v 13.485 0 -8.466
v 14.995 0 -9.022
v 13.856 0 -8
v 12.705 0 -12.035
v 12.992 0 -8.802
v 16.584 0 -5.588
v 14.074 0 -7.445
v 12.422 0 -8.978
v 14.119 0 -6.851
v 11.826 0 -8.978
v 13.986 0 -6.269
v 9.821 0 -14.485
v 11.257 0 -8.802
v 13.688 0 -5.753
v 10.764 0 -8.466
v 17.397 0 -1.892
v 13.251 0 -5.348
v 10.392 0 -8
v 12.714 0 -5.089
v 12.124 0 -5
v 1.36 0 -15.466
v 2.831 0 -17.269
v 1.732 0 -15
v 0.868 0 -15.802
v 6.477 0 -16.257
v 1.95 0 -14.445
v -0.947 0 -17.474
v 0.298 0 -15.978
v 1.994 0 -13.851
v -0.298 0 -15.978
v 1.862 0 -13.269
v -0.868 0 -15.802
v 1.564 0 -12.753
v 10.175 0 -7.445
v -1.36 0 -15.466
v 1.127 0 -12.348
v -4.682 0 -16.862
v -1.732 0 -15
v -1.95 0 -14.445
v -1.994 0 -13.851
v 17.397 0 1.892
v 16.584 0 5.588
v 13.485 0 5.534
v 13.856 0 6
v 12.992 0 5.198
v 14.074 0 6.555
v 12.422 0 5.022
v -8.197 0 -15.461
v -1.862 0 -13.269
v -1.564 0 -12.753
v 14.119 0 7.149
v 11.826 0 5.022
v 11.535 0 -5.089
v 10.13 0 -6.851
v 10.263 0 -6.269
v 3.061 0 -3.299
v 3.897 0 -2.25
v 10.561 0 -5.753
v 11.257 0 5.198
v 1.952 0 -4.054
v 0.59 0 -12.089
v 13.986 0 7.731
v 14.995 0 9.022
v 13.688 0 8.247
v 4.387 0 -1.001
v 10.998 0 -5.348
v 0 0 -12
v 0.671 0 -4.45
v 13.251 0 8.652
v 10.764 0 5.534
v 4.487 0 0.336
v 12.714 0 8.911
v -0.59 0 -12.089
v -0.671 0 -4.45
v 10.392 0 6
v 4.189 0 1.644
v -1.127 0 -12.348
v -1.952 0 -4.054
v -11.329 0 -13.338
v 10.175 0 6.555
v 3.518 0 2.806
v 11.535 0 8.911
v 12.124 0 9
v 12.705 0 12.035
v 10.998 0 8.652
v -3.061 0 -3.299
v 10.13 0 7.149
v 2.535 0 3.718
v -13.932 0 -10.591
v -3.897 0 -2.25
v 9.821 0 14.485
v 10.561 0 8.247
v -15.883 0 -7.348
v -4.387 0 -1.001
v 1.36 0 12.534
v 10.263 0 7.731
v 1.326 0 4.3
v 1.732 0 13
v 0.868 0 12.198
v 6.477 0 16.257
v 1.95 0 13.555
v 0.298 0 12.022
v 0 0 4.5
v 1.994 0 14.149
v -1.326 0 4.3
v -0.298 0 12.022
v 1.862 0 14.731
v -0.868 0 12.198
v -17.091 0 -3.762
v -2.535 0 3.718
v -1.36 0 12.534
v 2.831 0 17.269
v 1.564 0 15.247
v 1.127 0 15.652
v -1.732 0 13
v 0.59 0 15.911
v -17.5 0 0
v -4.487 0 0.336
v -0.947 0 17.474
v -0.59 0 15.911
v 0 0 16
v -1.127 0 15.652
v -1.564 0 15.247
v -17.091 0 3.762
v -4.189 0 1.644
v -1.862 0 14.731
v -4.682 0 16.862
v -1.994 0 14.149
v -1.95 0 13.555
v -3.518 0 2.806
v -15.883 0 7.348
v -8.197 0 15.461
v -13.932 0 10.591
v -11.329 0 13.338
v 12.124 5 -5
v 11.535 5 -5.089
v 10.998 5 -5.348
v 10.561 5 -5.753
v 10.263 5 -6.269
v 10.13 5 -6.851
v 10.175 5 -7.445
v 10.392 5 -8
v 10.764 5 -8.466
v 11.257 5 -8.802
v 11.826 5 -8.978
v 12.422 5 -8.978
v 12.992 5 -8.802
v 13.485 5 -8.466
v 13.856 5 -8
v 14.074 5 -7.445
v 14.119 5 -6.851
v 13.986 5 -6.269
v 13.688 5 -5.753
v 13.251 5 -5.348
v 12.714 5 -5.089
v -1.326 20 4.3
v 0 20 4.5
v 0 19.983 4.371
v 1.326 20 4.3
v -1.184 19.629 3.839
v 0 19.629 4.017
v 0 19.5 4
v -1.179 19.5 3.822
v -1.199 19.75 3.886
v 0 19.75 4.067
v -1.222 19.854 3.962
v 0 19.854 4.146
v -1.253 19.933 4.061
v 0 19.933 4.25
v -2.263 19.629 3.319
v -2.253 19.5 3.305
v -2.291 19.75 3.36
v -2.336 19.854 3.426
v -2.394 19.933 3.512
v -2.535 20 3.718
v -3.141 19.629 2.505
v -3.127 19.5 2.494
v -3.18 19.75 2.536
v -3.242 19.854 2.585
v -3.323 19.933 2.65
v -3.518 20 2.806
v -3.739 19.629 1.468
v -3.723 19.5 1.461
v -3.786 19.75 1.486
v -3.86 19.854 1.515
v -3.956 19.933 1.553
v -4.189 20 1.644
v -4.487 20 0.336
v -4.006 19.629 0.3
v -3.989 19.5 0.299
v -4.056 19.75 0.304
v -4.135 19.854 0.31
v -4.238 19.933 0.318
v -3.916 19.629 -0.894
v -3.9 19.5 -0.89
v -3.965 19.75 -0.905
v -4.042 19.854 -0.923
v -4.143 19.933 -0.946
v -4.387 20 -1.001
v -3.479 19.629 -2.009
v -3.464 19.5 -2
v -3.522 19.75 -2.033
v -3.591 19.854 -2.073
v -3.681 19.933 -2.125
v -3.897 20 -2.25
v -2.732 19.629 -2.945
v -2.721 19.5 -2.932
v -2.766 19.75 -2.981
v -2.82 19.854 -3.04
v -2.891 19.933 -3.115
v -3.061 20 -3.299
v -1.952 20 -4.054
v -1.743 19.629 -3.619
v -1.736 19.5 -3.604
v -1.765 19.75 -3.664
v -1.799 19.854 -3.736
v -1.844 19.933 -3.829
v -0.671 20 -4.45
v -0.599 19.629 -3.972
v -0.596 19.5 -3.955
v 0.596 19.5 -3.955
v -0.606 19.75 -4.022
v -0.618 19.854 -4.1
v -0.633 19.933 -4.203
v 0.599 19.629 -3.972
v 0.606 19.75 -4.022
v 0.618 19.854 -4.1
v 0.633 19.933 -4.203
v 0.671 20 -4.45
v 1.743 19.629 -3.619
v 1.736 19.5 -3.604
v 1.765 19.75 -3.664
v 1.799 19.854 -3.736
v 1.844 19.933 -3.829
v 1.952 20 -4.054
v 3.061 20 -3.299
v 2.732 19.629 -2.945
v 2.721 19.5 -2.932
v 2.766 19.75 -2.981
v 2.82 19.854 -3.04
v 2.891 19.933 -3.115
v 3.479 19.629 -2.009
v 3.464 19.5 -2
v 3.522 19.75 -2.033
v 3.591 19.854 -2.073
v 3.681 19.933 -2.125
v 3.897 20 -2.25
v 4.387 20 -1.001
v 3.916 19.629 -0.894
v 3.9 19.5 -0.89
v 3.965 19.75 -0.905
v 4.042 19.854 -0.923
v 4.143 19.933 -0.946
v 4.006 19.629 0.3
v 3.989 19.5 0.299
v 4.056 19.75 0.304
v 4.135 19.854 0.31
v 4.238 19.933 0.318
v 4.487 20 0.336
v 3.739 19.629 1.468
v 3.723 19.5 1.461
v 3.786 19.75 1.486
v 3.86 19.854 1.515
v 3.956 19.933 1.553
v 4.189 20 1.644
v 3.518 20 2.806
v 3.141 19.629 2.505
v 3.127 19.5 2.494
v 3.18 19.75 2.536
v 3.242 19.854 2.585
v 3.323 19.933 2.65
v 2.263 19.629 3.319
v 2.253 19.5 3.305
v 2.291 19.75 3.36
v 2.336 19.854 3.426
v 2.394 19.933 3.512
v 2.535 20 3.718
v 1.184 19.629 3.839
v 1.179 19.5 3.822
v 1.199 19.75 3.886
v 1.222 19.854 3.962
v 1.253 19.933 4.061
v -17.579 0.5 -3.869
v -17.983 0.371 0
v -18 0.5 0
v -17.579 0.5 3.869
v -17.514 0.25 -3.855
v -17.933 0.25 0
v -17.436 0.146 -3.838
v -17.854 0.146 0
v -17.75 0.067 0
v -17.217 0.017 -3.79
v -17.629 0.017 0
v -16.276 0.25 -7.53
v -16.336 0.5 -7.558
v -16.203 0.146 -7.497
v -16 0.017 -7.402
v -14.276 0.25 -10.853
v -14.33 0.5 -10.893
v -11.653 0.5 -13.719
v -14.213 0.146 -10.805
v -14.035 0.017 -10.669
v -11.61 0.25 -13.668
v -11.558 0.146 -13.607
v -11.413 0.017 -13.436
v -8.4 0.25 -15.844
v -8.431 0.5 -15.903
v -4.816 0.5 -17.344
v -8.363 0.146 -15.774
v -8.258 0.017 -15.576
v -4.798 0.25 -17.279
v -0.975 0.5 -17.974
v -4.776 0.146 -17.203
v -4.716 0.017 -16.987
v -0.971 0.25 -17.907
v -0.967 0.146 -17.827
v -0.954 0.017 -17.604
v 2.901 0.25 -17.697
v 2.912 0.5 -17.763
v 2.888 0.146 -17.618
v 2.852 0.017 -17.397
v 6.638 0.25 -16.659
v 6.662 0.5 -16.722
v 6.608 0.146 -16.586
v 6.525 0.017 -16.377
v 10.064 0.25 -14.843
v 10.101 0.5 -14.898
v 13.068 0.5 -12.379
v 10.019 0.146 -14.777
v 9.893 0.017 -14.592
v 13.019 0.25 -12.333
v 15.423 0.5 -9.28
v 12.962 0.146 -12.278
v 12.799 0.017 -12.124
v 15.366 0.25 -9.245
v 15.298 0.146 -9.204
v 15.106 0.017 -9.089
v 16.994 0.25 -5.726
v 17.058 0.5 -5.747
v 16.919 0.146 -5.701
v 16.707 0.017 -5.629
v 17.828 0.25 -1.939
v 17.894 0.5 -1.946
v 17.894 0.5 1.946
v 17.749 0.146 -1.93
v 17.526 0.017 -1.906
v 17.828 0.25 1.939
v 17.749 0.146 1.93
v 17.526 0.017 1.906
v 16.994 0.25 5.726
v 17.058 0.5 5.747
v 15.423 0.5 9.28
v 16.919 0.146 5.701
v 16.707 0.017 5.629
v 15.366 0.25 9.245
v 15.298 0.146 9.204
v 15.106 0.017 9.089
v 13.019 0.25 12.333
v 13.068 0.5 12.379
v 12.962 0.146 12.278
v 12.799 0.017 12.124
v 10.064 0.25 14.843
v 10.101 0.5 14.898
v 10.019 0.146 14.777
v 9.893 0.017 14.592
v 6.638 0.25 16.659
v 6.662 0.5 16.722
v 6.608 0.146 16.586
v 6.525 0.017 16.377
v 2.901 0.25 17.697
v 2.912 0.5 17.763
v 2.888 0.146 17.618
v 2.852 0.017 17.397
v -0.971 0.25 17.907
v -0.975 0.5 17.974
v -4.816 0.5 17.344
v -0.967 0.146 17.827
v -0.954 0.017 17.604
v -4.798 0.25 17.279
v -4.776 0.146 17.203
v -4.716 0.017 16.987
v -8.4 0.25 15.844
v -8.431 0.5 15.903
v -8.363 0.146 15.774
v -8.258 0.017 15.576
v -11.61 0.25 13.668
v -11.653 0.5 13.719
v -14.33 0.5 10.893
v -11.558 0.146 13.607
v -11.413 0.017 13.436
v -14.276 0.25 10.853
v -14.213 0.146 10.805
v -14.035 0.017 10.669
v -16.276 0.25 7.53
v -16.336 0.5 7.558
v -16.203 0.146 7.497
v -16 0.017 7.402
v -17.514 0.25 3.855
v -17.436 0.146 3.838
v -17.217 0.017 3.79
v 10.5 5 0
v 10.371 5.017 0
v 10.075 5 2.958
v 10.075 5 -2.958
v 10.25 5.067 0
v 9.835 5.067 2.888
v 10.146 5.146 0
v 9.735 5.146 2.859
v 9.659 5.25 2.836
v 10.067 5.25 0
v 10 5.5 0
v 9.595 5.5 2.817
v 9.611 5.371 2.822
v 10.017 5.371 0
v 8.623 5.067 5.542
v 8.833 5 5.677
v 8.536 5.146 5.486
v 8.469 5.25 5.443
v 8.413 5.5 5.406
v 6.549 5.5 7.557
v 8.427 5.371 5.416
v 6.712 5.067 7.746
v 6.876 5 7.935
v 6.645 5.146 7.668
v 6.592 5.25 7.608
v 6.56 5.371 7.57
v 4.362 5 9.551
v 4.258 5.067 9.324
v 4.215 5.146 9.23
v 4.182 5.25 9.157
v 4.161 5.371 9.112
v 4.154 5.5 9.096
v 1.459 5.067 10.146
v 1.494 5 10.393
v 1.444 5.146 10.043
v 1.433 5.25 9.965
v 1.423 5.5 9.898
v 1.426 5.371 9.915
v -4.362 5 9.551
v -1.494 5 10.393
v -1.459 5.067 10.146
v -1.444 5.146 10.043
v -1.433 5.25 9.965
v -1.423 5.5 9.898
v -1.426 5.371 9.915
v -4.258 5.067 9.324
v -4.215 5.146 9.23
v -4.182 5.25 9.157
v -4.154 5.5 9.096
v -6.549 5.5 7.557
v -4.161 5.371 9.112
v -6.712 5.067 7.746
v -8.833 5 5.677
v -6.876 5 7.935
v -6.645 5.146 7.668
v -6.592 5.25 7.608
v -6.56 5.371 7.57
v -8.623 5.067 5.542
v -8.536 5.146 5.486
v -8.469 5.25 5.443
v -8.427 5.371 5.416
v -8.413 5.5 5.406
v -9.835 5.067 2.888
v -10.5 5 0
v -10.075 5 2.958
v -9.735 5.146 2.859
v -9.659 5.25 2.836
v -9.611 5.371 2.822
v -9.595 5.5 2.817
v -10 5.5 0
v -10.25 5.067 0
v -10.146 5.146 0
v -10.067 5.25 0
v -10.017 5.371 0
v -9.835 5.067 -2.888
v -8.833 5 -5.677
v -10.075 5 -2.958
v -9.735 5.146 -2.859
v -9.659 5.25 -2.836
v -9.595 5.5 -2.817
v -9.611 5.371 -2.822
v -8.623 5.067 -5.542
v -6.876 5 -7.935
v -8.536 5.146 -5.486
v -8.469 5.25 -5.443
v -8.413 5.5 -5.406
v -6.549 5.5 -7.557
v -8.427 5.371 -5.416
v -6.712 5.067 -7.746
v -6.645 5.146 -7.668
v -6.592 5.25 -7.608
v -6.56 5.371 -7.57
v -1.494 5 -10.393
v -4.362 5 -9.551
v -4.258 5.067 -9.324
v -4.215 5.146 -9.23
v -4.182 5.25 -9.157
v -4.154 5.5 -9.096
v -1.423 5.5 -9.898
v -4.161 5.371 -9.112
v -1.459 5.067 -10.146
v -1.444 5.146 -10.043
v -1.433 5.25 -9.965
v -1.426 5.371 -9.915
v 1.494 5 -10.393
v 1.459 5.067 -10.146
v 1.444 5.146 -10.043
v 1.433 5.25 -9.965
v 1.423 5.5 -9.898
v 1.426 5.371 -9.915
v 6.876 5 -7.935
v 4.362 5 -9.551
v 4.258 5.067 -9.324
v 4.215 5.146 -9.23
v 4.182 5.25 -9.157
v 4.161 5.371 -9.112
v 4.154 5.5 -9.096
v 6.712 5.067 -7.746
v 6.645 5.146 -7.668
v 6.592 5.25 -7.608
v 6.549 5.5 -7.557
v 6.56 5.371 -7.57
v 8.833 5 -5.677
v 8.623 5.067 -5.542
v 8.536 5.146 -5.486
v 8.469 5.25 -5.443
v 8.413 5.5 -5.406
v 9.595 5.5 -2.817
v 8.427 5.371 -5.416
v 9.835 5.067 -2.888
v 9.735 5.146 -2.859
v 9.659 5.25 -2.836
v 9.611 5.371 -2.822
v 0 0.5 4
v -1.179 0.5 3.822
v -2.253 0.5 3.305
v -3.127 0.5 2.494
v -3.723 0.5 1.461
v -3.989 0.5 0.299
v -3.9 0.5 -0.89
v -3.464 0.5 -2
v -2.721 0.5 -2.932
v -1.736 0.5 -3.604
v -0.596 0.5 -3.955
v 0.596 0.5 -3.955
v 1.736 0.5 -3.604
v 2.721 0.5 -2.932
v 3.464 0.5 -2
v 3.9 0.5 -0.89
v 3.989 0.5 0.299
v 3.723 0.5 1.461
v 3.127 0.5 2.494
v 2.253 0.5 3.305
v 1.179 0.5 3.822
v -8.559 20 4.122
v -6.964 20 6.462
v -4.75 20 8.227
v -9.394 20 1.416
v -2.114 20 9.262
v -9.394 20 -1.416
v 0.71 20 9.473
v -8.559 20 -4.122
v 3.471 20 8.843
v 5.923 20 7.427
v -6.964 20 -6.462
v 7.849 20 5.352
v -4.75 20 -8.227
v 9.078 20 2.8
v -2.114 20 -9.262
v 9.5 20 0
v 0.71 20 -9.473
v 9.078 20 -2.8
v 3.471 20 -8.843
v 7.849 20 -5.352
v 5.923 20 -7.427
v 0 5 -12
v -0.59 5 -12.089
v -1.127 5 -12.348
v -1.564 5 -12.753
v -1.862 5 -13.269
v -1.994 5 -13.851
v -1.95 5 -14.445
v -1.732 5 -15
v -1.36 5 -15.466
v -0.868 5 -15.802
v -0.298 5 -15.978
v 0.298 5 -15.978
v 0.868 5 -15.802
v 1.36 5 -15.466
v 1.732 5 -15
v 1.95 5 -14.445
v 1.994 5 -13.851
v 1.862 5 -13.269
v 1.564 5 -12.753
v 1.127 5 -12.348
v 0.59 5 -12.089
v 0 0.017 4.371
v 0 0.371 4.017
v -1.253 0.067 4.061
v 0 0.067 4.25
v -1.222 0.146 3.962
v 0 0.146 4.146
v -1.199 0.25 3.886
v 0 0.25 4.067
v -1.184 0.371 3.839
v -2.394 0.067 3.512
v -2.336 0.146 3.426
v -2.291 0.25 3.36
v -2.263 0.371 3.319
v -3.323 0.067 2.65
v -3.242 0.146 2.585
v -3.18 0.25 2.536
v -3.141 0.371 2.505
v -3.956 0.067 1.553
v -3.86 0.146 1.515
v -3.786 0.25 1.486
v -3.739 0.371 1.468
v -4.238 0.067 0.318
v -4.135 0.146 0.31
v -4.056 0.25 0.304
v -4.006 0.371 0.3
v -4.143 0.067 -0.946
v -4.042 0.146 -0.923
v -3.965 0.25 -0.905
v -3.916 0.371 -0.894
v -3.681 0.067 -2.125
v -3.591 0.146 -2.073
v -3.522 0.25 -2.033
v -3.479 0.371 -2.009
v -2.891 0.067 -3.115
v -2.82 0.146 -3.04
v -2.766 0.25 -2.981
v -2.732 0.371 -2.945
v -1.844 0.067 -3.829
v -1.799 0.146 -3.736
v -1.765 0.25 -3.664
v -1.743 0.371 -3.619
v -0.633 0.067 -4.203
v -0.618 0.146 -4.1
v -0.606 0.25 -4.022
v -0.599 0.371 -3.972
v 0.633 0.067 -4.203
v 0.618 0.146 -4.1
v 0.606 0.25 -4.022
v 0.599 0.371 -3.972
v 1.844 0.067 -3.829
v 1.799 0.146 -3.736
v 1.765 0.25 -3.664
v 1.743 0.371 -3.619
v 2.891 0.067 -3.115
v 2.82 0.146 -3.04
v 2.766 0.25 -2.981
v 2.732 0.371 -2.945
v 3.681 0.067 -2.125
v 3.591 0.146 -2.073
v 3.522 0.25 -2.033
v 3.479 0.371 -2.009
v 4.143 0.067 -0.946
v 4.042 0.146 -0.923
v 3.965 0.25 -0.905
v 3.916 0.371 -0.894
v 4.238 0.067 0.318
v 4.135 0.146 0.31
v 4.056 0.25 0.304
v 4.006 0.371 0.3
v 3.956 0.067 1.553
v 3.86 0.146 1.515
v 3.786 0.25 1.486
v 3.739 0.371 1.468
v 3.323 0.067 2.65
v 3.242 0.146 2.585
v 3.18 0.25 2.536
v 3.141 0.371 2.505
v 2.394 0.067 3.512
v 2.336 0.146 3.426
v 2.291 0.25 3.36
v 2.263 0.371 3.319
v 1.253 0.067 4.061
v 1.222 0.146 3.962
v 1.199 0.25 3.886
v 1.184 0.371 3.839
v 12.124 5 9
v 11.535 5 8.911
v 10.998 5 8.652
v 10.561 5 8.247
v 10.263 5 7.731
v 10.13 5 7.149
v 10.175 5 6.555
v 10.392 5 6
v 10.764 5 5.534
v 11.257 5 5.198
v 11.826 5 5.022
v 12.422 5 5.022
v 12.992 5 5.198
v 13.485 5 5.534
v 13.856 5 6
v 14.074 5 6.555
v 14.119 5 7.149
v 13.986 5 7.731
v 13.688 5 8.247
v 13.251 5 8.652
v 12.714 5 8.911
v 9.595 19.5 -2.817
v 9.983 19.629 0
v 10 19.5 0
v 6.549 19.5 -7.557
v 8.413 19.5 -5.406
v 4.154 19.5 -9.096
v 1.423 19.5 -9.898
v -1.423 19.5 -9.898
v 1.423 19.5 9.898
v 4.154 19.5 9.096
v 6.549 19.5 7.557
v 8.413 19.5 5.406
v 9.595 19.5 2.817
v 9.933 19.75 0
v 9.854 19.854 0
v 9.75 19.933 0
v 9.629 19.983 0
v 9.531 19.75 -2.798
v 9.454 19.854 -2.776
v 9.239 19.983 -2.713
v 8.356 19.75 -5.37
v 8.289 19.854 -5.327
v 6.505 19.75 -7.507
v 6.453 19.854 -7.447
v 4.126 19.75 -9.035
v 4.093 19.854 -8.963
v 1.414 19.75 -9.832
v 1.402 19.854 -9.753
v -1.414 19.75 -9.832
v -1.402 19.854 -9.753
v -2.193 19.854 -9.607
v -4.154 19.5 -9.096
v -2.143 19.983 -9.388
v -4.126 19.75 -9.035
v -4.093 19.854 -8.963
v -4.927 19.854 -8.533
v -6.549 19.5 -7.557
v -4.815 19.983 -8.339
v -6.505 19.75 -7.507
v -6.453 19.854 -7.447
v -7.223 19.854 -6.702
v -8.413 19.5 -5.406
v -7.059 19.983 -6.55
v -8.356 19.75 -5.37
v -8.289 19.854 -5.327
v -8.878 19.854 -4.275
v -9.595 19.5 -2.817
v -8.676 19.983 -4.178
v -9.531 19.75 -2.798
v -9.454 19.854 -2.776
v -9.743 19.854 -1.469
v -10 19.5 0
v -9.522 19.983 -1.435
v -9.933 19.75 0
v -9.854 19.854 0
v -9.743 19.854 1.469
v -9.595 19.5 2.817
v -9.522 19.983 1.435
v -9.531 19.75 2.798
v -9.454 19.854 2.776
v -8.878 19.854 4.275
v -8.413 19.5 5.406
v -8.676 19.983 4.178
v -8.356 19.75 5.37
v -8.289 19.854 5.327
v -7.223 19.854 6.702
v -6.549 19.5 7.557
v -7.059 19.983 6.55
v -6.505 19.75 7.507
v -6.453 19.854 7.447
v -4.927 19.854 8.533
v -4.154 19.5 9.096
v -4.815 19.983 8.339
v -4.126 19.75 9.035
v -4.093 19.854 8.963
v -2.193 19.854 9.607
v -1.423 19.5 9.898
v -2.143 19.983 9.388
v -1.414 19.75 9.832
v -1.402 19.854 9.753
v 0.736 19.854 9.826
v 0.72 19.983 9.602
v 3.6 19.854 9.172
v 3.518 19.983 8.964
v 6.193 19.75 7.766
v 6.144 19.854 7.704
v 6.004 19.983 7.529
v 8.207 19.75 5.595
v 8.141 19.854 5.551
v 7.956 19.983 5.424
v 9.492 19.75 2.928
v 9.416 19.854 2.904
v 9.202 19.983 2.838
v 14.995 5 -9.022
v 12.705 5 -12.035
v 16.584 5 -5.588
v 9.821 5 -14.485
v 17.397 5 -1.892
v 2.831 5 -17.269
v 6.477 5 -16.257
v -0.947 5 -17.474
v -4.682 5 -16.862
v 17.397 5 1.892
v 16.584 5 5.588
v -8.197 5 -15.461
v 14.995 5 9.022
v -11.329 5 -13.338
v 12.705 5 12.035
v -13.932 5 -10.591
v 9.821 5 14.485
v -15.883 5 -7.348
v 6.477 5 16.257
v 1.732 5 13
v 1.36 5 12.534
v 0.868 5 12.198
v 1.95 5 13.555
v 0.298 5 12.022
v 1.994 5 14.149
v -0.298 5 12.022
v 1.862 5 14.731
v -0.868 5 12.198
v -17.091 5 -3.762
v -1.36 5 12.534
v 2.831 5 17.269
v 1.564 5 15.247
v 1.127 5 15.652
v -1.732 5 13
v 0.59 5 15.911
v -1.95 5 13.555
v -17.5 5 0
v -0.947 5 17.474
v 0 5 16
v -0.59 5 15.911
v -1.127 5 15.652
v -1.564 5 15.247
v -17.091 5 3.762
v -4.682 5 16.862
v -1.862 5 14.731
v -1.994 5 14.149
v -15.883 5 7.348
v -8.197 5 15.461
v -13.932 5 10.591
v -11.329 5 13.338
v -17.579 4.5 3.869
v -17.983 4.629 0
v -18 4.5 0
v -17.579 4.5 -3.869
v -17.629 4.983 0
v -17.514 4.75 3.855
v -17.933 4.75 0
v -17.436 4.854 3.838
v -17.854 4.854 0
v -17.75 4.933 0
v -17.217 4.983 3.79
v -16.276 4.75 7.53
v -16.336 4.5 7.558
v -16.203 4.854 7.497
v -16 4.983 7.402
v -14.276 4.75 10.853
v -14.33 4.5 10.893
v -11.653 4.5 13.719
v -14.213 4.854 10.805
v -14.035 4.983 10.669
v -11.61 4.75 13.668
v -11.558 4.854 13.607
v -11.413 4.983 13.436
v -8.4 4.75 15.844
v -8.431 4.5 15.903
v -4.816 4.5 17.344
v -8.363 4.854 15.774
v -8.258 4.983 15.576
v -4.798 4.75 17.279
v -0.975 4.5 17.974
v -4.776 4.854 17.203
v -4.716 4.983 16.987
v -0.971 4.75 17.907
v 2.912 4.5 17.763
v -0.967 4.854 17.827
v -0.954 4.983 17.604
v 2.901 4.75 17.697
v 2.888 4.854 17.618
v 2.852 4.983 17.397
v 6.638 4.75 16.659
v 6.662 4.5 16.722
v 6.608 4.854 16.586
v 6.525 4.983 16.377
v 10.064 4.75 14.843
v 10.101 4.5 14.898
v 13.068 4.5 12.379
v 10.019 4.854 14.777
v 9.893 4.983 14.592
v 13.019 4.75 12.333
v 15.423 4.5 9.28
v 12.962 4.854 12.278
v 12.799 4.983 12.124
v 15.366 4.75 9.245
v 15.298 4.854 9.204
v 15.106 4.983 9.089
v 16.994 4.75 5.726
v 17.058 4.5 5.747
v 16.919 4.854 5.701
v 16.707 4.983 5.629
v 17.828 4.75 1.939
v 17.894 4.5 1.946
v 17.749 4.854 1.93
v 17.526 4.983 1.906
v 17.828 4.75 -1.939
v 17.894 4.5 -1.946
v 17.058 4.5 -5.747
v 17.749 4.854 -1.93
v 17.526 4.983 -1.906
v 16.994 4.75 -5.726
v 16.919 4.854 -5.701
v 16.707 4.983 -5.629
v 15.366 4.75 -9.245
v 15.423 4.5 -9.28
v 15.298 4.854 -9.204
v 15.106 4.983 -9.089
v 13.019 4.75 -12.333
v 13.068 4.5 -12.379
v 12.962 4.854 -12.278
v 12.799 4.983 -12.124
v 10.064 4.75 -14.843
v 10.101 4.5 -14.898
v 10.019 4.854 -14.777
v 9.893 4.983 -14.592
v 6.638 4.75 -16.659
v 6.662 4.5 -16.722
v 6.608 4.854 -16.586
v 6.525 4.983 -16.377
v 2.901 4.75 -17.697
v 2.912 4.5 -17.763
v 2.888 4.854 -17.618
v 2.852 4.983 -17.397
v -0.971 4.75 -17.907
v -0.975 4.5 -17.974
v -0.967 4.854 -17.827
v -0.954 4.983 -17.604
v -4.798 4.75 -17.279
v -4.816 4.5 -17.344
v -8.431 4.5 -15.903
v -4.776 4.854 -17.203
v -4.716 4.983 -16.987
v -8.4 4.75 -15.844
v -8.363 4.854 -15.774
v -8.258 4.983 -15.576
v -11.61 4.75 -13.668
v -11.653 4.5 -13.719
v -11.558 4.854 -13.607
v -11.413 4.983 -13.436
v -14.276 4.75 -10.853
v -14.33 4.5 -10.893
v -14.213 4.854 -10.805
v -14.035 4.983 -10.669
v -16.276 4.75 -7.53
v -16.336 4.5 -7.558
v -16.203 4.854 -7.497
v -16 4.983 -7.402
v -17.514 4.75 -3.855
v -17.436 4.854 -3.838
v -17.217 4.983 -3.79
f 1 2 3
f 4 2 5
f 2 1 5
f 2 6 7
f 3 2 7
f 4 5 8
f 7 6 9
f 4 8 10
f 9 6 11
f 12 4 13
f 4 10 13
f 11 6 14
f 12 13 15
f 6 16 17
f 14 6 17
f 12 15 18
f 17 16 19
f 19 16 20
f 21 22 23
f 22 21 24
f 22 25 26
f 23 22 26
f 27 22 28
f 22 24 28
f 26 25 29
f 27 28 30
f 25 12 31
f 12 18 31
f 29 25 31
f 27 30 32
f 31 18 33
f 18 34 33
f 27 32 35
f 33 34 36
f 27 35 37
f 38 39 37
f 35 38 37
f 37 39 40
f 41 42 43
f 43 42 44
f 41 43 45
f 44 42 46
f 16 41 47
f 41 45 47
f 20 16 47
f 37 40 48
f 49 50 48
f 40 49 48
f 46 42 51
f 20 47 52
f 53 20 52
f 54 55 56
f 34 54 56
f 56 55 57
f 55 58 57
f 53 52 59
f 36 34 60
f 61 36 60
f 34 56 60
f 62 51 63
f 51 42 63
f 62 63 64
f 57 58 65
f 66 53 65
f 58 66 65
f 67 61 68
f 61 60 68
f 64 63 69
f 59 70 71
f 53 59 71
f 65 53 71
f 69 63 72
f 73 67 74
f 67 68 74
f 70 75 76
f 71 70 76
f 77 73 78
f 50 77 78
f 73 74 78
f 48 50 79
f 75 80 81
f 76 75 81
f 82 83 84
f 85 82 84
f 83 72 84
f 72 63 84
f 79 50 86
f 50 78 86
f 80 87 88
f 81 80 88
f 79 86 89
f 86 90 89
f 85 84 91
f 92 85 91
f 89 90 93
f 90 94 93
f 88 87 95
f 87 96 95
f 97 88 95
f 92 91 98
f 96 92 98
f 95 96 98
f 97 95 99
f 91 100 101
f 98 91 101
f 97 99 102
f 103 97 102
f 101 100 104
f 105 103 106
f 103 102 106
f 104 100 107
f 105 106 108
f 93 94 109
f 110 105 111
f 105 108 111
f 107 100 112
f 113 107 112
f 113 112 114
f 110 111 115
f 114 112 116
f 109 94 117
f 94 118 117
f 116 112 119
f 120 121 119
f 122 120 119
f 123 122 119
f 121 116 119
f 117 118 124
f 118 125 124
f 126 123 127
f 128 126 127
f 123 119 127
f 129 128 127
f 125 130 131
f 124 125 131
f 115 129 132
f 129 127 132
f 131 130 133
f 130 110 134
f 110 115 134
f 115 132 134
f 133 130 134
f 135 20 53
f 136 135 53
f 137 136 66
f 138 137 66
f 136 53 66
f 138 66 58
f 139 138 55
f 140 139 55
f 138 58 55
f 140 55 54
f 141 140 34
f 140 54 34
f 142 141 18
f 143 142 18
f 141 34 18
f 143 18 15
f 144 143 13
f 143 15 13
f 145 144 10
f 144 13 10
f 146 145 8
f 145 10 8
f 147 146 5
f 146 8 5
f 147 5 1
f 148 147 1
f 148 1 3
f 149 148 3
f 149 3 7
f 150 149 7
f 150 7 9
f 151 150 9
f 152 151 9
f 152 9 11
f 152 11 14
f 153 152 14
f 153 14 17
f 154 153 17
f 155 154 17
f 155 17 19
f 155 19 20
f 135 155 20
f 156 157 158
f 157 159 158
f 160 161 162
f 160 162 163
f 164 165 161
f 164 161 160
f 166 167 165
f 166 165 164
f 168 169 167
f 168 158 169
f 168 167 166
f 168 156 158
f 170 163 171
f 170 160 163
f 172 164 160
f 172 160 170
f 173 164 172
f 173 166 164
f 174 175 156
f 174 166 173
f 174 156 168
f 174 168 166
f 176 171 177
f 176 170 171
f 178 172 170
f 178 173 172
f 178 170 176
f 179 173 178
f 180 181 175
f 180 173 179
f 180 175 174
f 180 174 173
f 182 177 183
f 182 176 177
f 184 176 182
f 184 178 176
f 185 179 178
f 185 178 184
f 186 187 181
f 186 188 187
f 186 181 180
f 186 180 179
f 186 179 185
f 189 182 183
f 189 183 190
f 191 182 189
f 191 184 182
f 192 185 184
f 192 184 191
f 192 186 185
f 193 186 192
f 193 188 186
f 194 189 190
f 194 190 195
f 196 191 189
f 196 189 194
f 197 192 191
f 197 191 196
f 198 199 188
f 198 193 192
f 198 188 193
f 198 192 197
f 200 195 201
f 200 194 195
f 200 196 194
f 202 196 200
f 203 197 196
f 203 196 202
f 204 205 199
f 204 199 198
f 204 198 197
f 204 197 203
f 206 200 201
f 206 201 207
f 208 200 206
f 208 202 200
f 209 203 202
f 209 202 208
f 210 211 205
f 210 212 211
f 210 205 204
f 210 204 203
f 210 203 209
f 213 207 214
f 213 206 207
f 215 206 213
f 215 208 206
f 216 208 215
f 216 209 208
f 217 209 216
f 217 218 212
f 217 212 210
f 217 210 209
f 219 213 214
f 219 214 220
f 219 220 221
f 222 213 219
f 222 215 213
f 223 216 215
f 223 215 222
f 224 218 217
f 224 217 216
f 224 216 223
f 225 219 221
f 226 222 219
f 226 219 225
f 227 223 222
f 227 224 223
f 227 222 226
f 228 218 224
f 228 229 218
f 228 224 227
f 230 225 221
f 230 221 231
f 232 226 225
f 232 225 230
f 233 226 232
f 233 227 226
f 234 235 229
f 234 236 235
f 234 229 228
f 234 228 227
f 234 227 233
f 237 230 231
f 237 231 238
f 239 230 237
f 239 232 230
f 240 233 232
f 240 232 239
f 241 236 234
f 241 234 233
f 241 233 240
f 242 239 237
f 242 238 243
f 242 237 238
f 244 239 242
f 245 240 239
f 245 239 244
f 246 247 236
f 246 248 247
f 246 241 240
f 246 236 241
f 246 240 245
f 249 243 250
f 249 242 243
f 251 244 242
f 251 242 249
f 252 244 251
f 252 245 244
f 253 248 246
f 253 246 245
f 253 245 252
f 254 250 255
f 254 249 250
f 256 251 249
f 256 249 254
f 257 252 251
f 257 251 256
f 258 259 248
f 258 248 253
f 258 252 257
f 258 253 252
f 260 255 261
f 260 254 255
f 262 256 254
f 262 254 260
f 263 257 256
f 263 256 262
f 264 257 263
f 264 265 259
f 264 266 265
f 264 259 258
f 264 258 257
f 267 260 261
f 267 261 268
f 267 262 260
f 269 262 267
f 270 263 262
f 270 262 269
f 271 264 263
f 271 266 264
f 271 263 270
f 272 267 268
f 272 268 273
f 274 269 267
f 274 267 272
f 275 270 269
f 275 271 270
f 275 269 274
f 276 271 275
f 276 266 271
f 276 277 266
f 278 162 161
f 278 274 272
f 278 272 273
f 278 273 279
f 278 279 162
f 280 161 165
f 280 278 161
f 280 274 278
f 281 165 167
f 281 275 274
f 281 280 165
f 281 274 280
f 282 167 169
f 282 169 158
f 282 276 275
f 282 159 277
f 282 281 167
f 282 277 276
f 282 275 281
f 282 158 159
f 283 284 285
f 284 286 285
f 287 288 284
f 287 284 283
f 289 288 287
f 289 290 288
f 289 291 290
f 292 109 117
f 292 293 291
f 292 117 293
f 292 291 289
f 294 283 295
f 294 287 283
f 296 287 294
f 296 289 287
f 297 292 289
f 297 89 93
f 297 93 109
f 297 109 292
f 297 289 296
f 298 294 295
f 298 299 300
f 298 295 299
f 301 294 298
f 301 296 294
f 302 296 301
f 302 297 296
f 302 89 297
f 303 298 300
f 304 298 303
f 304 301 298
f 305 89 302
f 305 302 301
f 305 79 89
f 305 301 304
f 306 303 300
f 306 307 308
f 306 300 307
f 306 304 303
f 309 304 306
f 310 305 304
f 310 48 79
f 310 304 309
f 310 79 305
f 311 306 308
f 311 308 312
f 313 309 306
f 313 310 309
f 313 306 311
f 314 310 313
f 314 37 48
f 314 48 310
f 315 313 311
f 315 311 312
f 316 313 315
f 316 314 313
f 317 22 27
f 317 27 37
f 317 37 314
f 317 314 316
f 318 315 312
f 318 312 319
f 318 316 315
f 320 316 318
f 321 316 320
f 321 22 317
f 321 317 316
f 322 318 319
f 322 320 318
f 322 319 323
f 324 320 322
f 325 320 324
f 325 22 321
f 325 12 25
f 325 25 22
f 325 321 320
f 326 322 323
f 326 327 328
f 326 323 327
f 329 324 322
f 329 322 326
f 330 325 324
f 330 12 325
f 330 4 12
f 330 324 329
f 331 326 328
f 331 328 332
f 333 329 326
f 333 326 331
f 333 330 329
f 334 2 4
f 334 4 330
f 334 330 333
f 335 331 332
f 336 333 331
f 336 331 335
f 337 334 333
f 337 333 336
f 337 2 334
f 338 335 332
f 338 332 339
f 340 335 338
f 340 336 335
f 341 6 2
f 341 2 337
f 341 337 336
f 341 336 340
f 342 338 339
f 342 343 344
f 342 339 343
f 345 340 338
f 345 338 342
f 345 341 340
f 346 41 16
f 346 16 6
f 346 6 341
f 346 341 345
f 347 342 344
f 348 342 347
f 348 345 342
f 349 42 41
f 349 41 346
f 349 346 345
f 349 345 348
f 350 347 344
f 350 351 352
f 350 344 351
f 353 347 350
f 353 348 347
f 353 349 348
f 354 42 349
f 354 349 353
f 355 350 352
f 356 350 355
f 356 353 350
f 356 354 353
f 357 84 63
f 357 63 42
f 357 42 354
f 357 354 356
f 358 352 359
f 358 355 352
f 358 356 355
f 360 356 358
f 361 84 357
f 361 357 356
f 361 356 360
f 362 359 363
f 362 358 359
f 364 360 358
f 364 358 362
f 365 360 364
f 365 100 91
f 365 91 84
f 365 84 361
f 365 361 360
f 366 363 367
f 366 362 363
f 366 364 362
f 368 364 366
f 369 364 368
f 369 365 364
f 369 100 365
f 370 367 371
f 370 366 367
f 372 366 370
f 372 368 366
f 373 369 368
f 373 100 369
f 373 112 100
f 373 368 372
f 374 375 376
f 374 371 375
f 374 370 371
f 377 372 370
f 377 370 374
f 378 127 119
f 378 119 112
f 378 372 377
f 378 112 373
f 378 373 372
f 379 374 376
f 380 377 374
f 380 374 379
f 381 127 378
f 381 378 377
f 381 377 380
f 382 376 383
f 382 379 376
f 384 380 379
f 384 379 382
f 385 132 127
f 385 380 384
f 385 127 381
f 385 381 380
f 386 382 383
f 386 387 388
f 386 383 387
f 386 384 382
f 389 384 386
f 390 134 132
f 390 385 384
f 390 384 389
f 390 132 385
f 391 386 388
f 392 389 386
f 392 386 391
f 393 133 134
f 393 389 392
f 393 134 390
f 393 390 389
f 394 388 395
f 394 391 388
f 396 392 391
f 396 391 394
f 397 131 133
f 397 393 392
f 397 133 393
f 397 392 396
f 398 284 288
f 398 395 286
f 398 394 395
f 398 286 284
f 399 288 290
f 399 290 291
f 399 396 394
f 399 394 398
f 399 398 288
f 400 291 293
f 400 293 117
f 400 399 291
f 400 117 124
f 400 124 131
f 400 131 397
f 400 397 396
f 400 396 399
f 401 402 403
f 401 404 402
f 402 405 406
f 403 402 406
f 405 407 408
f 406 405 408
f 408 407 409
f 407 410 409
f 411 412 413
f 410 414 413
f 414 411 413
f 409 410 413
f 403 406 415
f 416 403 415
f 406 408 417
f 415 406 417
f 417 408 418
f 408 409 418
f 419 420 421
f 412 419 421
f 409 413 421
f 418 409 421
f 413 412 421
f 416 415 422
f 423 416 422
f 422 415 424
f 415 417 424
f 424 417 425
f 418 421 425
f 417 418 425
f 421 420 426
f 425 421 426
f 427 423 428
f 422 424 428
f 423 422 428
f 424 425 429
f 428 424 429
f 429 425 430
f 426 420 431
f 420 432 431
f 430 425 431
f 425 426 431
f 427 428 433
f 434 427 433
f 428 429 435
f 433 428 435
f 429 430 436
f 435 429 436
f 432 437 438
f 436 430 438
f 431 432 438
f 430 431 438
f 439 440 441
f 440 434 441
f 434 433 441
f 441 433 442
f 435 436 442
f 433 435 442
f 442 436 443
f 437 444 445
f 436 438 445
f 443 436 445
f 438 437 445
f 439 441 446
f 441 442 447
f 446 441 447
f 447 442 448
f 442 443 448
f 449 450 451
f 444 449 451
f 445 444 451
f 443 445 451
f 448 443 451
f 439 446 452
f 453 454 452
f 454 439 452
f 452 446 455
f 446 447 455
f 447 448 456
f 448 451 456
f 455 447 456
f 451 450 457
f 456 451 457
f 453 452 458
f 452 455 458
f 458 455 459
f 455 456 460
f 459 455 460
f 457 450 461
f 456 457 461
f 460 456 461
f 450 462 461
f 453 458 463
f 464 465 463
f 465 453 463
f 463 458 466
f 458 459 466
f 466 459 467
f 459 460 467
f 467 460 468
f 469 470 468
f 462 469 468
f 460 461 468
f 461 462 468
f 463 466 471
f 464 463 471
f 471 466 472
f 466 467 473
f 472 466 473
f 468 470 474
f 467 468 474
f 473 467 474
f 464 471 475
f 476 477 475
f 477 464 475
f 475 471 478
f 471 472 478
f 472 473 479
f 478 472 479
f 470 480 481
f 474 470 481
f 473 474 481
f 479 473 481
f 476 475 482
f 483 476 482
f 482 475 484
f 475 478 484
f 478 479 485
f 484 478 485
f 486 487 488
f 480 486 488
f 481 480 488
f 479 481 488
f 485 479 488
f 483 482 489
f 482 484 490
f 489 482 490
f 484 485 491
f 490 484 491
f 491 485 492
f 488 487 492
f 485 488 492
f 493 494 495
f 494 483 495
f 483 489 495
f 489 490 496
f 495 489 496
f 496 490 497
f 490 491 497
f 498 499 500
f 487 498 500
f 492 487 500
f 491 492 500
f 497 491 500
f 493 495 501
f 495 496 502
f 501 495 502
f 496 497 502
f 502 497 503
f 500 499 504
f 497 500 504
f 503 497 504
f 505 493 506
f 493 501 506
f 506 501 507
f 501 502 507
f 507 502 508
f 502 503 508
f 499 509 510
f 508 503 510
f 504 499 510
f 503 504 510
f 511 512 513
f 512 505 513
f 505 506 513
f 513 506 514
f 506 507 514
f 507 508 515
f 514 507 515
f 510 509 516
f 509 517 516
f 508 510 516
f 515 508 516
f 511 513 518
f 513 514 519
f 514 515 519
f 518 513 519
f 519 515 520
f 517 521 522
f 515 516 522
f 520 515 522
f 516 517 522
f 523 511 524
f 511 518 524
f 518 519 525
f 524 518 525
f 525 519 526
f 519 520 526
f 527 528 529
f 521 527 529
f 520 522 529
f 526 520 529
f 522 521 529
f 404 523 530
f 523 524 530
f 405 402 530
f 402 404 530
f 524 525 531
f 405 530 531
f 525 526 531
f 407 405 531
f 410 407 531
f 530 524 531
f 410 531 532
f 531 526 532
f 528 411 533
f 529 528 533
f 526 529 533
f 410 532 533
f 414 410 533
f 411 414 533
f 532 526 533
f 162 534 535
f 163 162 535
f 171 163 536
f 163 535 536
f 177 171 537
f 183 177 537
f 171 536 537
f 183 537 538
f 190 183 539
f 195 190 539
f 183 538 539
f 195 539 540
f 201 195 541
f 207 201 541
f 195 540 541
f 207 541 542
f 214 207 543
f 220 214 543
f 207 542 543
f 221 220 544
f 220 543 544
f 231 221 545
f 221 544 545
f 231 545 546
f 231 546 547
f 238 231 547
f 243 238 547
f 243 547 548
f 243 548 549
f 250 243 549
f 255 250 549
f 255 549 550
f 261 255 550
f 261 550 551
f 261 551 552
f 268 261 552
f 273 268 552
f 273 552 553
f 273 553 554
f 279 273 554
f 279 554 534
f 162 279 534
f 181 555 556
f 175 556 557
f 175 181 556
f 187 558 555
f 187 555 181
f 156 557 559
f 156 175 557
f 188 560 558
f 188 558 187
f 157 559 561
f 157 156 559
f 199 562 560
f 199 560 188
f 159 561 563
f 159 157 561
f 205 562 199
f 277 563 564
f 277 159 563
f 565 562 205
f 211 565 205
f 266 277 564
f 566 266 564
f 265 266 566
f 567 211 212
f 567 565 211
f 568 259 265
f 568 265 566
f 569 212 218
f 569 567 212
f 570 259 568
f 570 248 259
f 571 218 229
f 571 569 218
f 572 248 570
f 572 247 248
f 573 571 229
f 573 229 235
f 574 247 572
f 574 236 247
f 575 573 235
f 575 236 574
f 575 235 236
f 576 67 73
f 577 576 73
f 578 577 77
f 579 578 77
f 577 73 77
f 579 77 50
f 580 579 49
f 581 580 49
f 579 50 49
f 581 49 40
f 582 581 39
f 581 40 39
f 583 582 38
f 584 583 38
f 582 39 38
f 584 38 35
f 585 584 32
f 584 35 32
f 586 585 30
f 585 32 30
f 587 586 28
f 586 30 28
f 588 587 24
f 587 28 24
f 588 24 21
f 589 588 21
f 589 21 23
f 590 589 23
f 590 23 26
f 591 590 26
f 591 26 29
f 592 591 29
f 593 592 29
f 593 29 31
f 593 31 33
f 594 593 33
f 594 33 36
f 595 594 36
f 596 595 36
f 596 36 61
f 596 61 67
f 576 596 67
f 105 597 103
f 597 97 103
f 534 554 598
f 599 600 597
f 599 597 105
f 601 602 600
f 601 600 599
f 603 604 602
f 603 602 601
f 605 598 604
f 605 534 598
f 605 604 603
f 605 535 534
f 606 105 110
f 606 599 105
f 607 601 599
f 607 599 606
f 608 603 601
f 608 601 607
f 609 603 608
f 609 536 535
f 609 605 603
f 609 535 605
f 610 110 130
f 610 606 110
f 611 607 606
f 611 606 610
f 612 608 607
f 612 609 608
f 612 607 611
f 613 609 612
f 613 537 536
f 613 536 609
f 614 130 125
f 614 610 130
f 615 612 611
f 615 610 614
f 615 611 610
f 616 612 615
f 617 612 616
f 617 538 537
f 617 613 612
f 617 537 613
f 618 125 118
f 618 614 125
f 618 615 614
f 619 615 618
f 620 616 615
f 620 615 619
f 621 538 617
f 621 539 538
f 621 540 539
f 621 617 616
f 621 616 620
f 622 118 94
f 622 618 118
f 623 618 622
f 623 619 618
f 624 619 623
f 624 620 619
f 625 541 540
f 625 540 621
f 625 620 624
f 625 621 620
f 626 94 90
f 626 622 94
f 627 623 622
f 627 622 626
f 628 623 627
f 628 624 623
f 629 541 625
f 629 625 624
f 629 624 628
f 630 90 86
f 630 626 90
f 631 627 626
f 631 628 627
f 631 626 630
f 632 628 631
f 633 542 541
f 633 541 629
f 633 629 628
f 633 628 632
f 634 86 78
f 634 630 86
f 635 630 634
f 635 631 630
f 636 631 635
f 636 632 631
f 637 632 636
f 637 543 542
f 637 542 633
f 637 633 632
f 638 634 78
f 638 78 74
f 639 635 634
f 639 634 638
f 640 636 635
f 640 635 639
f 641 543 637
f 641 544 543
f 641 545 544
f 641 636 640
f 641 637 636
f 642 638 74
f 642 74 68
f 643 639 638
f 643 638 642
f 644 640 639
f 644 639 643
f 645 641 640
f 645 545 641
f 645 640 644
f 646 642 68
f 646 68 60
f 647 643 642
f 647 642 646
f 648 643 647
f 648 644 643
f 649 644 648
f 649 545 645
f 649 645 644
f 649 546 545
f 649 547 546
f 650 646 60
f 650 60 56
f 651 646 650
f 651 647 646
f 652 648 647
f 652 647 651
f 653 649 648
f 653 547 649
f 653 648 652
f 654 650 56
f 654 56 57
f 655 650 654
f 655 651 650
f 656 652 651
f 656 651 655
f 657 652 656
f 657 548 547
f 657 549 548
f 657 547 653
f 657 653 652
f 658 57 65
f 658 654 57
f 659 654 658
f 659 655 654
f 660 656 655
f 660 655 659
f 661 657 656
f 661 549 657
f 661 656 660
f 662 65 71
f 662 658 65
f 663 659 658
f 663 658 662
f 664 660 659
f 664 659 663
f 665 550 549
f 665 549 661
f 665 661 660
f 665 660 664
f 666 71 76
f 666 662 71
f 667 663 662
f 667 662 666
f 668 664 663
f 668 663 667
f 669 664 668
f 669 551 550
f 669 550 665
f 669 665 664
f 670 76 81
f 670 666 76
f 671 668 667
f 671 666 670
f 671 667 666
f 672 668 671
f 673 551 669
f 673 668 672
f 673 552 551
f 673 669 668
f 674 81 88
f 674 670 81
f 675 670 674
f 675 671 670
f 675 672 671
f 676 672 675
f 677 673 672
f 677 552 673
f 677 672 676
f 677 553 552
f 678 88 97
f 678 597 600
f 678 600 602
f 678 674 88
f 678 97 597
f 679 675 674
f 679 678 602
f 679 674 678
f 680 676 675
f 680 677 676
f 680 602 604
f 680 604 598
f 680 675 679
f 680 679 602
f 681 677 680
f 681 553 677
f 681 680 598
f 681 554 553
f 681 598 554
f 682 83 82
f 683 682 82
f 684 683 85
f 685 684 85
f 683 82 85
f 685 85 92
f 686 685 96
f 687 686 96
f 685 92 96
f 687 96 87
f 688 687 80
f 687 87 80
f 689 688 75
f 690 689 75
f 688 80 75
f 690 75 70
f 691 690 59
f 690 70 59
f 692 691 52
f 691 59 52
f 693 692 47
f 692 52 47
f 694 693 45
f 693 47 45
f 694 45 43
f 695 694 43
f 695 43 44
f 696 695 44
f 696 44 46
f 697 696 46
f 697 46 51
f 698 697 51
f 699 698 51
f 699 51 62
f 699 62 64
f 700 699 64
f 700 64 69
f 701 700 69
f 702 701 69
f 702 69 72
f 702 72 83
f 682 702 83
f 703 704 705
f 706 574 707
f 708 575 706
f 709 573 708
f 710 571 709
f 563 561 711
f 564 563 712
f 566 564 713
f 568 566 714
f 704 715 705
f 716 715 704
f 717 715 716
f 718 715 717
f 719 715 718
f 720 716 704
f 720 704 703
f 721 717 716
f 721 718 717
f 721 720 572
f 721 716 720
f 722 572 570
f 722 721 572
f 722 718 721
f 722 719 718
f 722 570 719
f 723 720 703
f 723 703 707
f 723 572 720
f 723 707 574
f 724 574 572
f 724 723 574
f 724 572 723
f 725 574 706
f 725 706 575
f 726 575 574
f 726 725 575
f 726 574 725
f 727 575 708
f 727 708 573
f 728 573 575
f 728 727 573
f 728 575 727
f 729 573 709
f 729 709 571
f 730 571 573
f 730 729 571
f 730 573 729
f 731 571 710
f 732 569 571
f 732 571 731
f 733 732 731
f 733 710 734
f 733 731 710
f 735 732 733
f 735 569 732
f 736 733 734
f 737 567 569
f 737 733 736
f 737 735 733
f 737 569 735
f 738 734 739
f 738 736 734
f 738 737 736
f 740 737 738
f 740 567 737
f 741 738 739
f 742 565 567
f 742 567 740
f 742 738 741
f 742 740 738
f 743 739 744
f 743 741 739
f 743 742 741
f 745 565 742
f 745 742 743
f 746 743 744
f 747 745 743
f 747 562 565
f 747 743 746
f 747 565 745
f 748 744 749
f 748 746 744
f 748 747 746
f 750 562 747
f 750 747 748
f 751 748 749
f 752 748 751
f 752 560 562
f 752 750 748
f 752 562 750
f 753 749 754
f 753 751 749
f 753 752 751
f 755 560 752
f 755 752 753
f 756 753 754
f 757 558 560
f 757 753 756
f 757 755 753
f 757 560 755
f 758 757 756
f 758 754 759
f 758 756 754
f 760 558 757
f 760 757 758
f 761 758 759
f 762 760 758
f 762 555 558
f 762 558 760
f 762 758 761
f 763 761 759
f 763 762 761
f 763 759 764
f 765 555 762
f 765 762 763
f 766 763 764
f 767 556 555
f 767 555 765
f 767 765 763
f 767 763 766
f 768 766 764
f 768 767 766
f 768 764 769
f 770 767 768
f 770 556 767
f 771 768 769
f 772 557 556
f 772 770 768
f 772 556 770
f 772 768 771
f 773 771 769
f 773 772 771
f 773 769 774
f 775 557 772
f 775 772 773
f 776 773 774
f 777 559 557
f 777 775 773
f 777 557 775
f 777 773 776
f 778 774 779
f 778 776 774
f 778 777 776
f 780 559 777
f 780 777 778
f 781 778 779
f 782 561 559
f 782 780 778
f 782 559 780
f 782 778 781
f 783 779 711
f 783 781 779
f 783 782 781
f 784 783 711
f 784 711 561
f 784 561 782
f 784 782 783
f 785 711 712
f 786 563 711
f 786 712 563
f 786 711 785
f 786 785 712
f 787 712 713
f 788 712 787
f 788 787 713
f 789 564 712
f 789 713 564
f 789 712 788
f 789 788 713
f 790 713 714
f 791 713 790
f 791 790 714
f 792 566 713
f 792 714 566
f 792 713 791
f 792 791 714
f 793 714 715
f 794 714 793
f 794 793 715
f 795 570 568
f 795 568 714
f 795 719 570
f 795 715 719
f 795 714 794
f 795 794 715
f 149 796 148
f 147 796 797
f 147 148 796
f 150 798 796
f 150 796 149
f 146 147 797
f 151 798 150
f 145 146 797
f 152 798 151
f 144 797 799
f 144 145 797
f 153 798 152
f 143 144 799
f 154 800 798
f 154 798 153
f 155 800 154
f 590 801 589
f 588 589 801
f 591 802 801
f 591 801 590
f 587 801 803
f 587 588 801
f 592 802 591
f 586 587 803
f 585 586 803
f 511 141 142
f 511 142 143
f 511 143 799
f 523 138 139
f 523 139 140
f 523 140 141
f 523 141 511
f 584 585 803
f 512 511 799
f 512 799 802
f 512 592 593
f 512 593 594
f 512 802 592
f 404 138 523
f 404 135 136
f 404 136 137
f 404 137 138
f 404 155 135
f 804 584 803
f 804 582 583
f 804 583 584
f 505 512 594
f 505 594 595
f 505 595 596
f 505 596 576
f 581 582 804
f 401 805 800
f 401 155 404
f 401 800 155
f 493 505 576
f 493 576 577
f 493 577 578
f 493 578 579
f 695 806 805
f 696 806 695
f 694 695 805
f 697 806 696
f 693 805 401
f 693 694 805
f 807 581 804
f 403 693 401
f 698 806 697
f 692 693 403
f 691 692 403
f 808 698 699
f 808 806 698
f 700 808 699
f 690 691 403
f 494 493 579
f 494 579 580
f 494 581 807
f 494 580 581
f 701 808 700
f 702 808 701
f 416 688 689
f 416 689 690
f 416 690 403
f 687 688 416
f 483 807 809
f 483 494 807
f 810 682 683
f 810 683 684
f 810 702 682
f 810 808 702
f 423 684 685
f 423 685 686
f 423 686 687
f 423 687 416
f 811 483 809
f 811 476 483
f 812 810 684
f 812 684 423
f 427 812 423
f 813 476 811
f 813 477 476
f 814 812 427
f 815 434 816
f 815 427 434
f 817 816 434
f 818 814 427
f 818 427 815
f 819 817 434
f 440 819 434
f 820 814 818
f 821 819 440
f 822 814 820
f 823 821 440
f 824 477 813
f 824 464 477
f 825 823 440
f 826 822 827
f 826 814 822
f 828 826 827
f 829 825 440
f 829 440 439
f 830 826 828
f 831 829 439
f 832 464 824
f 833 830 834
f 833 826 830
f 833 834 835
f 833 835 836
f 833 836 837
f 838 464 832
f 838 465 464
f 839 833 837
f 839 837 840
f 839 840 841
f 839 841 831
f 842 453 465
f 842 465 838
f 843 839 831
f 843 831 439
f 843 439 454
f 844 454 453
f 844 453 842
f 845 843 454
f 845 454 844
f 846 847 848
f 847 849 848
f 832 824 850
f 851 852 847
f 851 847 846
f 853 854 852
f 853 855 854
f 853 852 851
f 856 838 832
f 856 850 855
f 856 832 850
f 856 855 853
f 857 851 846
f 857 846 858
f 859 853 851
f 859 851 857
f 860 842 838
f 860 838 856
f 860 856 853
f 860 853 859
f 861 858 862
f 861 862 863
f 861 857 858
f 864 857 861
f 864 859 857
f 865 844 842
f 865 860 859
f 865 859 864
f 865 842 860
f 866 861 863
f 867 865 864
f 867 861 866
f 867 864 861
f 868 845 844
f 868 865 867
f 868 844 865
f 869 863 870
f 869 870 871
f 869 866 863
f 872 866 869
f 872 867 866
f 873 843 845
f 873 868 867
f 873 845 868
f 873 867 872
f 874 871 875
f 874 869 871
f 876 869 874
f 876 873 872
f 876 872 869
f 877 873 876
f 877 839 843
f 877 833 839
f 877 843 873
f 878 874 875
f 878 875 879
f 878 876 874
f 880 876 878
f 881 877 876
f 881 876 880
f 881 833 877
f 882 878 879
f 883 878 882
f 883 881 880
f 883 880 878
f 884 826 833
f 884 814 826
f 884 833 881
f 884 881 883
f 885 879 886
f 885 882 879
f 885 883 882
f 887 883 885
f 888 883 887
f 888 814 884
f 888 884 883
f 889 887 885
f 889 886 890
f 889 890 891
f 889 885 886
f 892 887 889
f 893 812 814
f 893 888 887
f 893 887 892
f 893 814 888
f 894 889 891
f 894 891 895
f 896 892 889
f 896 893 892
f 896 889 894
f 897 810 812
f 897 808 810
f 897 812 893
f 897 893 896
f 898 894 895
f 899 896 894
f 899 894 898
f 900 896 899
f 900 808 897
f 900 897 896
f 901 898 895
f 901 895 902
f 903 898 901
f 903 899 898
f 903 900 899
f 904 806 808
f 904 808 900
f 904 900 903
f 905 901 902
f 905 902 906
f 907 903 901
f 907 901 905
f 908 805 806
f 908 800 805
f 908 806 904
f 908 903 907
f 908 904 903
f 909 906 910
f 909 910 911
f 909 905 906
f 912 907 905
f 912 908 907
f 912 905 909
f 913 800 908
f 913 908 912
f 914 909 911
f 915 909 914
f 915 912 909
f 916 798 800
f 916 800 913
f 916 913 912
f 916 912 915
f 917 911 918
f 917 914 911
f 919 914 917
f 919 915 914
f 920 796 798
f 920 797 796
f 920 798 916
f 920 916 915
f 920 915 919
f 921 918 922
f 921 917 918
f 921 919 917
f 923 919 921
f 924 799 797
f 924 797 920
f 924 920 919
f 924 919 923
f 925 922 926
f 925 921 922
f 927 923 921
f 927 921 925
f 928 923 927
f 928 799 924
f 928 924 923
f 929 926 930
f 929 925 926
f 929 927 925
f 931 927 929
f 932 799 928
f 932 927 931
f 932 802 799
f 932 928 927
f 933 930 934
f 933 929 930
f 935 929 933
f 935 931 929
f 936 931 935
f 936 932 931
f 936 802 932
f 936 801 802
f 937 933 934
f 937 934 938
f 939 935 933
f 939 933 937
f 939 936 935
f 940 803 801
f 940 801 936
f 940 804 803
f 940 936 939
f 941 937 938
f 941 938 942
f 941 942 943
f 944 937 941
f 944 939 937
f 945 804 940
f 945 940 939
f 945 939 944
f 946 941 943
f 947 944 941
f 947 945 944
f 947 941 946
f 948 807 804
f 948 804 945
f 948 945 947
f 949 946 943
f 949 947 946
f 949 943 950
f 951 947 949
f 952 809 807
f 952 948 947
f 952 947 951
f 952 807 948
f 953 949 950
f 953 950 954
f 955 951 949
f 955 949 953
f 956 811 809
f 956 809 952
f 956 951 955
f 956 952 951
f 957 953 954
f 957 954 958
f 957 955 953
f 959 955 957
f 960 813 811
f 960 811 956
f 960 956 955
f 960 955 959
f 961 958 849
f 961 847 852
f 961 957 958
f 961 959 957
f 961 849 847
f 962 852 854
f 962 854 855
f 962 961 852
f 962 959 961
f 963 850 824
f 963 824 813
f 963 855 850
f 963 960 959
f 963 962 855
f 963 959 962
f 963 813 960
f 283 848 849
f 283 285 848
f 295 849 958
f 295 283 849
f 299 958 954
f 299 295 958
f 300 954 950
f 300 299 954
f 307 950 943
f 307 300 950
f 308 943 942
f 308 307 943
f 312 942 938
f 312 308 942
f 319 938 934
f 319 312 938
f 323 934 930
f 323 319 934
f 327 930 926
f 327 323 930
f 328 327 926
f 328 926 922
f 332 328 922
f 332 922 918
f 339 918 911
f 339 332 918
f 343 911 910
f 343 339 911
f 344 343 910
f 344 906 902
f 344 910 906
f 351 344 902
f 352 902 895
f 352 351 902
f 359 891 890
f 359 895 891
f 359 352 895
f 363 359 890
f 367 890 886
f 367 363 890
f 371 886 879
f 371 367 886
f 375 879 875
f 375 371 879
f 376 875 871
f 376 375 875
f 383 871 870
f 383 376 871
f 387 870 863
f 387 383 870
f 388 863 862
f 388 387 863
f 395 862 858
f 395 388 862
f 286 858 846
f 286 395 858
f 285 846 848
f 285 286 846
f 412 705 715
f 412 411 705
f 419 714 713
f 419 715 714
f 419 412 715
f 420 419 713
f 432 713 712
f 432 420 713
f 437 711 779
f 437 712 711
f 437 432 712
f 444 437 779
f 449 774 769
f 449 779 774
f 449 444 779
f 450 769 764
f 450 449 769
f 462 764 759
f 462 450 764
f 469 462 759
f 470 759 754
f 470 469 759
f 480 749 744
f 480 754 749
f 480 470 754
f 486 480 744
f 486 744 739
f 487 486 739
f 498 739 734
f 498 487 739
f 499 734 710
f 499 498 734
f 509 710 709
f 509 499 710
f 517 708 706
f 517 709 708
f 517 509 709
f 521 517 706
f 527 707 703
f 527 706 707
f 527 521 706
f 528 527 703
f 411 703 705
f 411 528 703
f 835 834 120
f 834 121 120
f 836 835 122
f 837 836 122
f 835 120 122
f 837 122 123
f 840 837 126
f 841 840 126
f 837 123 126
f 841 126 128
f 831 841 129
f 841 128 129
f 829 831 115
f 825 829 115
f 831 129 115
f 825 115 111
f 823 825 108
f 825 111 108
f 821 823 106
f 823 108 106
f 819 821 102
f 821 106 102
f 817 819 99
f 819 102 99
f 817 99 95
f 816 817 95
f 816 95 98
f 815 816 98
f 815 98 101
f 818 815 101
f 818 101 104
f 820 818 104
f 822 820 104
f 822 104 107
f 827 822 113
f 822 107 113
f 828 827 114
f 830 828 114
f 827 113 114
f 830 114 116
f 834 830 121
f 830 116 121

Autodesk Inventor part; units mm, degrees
ref_plane "YZ Plane" through (0, 0, 0) normal (1, 0, 0) x (0, 1, 0)
ref_plane "XZ Plane" through (0, 0, 0) normal (0, 1, 0) x (-1, 0, 0)
ref_plane "XY Plane" through (0, 0, 0) normal (0, 0, 1) x (1, 0, 0)
sketch "Sketch1" plane through (0, 0, 0) normal (0, 1, 0) x (-1, 0, 0)
  circle A0 centre (0, 0) radius 18
  dimension "d0" = 36
extrude "Extrusion1" add sketch "Sketch1" along normal blind 5
sketch "Sketch2" plane through (0, 5, 0) normal (0, 1, 0) x (1, 0, 0)
  circle A0 centre (0, 0) radius 10
  dimension "d3" = 20
extrude "Extrusion2" add sketch "Sketch2" along normal blind 15
sketch "Sketch3" plane through (0, 20, 0) normal (0, 1, 0) x (1, 0, 0)
  point P0 (0, 0)
hole "Hole1" at (0, 20, 0) direction (0, -1, 0) diameter 8 end through all
sketch "Sketch4" plane through (0, 5, 0) normal (0, 1, 0) x (1, 0, 0)
  circle A0 centre (0, 0) radius 14
  circle A1 centre (0, -14) radius 2
  circle A2 centre (12.1244, -7) radius 2
  circle A3 centre (12.1244, 7) radius 2
  circle A4 centre (0, 14) radius 2
  circle A5 centre (-12.1244, 7) radius 2
  circle A6 centre (-12.1244, -7) radius 2
  dimension "d13" = 28
  dimension "d14" = 4
  dimension "d17" = 360
hole "Hole2" at (0, 5, -14) at (0, 5, 14) at (12.1244, 5, 7) at (12.1244, 5, -7) direction (0, -1, 0) diameter 4 end through all
fillet "Fillet1" radius 0.5 6 edges at (0, 20, -4) (-10, 20, 0) (-10, 5, 0) (18, 5, 0) (18, 0, 0) (0, 0, -4)
equation "\"d19\" = d14"
properties part number "Trapezmutter_T8_ganz"
